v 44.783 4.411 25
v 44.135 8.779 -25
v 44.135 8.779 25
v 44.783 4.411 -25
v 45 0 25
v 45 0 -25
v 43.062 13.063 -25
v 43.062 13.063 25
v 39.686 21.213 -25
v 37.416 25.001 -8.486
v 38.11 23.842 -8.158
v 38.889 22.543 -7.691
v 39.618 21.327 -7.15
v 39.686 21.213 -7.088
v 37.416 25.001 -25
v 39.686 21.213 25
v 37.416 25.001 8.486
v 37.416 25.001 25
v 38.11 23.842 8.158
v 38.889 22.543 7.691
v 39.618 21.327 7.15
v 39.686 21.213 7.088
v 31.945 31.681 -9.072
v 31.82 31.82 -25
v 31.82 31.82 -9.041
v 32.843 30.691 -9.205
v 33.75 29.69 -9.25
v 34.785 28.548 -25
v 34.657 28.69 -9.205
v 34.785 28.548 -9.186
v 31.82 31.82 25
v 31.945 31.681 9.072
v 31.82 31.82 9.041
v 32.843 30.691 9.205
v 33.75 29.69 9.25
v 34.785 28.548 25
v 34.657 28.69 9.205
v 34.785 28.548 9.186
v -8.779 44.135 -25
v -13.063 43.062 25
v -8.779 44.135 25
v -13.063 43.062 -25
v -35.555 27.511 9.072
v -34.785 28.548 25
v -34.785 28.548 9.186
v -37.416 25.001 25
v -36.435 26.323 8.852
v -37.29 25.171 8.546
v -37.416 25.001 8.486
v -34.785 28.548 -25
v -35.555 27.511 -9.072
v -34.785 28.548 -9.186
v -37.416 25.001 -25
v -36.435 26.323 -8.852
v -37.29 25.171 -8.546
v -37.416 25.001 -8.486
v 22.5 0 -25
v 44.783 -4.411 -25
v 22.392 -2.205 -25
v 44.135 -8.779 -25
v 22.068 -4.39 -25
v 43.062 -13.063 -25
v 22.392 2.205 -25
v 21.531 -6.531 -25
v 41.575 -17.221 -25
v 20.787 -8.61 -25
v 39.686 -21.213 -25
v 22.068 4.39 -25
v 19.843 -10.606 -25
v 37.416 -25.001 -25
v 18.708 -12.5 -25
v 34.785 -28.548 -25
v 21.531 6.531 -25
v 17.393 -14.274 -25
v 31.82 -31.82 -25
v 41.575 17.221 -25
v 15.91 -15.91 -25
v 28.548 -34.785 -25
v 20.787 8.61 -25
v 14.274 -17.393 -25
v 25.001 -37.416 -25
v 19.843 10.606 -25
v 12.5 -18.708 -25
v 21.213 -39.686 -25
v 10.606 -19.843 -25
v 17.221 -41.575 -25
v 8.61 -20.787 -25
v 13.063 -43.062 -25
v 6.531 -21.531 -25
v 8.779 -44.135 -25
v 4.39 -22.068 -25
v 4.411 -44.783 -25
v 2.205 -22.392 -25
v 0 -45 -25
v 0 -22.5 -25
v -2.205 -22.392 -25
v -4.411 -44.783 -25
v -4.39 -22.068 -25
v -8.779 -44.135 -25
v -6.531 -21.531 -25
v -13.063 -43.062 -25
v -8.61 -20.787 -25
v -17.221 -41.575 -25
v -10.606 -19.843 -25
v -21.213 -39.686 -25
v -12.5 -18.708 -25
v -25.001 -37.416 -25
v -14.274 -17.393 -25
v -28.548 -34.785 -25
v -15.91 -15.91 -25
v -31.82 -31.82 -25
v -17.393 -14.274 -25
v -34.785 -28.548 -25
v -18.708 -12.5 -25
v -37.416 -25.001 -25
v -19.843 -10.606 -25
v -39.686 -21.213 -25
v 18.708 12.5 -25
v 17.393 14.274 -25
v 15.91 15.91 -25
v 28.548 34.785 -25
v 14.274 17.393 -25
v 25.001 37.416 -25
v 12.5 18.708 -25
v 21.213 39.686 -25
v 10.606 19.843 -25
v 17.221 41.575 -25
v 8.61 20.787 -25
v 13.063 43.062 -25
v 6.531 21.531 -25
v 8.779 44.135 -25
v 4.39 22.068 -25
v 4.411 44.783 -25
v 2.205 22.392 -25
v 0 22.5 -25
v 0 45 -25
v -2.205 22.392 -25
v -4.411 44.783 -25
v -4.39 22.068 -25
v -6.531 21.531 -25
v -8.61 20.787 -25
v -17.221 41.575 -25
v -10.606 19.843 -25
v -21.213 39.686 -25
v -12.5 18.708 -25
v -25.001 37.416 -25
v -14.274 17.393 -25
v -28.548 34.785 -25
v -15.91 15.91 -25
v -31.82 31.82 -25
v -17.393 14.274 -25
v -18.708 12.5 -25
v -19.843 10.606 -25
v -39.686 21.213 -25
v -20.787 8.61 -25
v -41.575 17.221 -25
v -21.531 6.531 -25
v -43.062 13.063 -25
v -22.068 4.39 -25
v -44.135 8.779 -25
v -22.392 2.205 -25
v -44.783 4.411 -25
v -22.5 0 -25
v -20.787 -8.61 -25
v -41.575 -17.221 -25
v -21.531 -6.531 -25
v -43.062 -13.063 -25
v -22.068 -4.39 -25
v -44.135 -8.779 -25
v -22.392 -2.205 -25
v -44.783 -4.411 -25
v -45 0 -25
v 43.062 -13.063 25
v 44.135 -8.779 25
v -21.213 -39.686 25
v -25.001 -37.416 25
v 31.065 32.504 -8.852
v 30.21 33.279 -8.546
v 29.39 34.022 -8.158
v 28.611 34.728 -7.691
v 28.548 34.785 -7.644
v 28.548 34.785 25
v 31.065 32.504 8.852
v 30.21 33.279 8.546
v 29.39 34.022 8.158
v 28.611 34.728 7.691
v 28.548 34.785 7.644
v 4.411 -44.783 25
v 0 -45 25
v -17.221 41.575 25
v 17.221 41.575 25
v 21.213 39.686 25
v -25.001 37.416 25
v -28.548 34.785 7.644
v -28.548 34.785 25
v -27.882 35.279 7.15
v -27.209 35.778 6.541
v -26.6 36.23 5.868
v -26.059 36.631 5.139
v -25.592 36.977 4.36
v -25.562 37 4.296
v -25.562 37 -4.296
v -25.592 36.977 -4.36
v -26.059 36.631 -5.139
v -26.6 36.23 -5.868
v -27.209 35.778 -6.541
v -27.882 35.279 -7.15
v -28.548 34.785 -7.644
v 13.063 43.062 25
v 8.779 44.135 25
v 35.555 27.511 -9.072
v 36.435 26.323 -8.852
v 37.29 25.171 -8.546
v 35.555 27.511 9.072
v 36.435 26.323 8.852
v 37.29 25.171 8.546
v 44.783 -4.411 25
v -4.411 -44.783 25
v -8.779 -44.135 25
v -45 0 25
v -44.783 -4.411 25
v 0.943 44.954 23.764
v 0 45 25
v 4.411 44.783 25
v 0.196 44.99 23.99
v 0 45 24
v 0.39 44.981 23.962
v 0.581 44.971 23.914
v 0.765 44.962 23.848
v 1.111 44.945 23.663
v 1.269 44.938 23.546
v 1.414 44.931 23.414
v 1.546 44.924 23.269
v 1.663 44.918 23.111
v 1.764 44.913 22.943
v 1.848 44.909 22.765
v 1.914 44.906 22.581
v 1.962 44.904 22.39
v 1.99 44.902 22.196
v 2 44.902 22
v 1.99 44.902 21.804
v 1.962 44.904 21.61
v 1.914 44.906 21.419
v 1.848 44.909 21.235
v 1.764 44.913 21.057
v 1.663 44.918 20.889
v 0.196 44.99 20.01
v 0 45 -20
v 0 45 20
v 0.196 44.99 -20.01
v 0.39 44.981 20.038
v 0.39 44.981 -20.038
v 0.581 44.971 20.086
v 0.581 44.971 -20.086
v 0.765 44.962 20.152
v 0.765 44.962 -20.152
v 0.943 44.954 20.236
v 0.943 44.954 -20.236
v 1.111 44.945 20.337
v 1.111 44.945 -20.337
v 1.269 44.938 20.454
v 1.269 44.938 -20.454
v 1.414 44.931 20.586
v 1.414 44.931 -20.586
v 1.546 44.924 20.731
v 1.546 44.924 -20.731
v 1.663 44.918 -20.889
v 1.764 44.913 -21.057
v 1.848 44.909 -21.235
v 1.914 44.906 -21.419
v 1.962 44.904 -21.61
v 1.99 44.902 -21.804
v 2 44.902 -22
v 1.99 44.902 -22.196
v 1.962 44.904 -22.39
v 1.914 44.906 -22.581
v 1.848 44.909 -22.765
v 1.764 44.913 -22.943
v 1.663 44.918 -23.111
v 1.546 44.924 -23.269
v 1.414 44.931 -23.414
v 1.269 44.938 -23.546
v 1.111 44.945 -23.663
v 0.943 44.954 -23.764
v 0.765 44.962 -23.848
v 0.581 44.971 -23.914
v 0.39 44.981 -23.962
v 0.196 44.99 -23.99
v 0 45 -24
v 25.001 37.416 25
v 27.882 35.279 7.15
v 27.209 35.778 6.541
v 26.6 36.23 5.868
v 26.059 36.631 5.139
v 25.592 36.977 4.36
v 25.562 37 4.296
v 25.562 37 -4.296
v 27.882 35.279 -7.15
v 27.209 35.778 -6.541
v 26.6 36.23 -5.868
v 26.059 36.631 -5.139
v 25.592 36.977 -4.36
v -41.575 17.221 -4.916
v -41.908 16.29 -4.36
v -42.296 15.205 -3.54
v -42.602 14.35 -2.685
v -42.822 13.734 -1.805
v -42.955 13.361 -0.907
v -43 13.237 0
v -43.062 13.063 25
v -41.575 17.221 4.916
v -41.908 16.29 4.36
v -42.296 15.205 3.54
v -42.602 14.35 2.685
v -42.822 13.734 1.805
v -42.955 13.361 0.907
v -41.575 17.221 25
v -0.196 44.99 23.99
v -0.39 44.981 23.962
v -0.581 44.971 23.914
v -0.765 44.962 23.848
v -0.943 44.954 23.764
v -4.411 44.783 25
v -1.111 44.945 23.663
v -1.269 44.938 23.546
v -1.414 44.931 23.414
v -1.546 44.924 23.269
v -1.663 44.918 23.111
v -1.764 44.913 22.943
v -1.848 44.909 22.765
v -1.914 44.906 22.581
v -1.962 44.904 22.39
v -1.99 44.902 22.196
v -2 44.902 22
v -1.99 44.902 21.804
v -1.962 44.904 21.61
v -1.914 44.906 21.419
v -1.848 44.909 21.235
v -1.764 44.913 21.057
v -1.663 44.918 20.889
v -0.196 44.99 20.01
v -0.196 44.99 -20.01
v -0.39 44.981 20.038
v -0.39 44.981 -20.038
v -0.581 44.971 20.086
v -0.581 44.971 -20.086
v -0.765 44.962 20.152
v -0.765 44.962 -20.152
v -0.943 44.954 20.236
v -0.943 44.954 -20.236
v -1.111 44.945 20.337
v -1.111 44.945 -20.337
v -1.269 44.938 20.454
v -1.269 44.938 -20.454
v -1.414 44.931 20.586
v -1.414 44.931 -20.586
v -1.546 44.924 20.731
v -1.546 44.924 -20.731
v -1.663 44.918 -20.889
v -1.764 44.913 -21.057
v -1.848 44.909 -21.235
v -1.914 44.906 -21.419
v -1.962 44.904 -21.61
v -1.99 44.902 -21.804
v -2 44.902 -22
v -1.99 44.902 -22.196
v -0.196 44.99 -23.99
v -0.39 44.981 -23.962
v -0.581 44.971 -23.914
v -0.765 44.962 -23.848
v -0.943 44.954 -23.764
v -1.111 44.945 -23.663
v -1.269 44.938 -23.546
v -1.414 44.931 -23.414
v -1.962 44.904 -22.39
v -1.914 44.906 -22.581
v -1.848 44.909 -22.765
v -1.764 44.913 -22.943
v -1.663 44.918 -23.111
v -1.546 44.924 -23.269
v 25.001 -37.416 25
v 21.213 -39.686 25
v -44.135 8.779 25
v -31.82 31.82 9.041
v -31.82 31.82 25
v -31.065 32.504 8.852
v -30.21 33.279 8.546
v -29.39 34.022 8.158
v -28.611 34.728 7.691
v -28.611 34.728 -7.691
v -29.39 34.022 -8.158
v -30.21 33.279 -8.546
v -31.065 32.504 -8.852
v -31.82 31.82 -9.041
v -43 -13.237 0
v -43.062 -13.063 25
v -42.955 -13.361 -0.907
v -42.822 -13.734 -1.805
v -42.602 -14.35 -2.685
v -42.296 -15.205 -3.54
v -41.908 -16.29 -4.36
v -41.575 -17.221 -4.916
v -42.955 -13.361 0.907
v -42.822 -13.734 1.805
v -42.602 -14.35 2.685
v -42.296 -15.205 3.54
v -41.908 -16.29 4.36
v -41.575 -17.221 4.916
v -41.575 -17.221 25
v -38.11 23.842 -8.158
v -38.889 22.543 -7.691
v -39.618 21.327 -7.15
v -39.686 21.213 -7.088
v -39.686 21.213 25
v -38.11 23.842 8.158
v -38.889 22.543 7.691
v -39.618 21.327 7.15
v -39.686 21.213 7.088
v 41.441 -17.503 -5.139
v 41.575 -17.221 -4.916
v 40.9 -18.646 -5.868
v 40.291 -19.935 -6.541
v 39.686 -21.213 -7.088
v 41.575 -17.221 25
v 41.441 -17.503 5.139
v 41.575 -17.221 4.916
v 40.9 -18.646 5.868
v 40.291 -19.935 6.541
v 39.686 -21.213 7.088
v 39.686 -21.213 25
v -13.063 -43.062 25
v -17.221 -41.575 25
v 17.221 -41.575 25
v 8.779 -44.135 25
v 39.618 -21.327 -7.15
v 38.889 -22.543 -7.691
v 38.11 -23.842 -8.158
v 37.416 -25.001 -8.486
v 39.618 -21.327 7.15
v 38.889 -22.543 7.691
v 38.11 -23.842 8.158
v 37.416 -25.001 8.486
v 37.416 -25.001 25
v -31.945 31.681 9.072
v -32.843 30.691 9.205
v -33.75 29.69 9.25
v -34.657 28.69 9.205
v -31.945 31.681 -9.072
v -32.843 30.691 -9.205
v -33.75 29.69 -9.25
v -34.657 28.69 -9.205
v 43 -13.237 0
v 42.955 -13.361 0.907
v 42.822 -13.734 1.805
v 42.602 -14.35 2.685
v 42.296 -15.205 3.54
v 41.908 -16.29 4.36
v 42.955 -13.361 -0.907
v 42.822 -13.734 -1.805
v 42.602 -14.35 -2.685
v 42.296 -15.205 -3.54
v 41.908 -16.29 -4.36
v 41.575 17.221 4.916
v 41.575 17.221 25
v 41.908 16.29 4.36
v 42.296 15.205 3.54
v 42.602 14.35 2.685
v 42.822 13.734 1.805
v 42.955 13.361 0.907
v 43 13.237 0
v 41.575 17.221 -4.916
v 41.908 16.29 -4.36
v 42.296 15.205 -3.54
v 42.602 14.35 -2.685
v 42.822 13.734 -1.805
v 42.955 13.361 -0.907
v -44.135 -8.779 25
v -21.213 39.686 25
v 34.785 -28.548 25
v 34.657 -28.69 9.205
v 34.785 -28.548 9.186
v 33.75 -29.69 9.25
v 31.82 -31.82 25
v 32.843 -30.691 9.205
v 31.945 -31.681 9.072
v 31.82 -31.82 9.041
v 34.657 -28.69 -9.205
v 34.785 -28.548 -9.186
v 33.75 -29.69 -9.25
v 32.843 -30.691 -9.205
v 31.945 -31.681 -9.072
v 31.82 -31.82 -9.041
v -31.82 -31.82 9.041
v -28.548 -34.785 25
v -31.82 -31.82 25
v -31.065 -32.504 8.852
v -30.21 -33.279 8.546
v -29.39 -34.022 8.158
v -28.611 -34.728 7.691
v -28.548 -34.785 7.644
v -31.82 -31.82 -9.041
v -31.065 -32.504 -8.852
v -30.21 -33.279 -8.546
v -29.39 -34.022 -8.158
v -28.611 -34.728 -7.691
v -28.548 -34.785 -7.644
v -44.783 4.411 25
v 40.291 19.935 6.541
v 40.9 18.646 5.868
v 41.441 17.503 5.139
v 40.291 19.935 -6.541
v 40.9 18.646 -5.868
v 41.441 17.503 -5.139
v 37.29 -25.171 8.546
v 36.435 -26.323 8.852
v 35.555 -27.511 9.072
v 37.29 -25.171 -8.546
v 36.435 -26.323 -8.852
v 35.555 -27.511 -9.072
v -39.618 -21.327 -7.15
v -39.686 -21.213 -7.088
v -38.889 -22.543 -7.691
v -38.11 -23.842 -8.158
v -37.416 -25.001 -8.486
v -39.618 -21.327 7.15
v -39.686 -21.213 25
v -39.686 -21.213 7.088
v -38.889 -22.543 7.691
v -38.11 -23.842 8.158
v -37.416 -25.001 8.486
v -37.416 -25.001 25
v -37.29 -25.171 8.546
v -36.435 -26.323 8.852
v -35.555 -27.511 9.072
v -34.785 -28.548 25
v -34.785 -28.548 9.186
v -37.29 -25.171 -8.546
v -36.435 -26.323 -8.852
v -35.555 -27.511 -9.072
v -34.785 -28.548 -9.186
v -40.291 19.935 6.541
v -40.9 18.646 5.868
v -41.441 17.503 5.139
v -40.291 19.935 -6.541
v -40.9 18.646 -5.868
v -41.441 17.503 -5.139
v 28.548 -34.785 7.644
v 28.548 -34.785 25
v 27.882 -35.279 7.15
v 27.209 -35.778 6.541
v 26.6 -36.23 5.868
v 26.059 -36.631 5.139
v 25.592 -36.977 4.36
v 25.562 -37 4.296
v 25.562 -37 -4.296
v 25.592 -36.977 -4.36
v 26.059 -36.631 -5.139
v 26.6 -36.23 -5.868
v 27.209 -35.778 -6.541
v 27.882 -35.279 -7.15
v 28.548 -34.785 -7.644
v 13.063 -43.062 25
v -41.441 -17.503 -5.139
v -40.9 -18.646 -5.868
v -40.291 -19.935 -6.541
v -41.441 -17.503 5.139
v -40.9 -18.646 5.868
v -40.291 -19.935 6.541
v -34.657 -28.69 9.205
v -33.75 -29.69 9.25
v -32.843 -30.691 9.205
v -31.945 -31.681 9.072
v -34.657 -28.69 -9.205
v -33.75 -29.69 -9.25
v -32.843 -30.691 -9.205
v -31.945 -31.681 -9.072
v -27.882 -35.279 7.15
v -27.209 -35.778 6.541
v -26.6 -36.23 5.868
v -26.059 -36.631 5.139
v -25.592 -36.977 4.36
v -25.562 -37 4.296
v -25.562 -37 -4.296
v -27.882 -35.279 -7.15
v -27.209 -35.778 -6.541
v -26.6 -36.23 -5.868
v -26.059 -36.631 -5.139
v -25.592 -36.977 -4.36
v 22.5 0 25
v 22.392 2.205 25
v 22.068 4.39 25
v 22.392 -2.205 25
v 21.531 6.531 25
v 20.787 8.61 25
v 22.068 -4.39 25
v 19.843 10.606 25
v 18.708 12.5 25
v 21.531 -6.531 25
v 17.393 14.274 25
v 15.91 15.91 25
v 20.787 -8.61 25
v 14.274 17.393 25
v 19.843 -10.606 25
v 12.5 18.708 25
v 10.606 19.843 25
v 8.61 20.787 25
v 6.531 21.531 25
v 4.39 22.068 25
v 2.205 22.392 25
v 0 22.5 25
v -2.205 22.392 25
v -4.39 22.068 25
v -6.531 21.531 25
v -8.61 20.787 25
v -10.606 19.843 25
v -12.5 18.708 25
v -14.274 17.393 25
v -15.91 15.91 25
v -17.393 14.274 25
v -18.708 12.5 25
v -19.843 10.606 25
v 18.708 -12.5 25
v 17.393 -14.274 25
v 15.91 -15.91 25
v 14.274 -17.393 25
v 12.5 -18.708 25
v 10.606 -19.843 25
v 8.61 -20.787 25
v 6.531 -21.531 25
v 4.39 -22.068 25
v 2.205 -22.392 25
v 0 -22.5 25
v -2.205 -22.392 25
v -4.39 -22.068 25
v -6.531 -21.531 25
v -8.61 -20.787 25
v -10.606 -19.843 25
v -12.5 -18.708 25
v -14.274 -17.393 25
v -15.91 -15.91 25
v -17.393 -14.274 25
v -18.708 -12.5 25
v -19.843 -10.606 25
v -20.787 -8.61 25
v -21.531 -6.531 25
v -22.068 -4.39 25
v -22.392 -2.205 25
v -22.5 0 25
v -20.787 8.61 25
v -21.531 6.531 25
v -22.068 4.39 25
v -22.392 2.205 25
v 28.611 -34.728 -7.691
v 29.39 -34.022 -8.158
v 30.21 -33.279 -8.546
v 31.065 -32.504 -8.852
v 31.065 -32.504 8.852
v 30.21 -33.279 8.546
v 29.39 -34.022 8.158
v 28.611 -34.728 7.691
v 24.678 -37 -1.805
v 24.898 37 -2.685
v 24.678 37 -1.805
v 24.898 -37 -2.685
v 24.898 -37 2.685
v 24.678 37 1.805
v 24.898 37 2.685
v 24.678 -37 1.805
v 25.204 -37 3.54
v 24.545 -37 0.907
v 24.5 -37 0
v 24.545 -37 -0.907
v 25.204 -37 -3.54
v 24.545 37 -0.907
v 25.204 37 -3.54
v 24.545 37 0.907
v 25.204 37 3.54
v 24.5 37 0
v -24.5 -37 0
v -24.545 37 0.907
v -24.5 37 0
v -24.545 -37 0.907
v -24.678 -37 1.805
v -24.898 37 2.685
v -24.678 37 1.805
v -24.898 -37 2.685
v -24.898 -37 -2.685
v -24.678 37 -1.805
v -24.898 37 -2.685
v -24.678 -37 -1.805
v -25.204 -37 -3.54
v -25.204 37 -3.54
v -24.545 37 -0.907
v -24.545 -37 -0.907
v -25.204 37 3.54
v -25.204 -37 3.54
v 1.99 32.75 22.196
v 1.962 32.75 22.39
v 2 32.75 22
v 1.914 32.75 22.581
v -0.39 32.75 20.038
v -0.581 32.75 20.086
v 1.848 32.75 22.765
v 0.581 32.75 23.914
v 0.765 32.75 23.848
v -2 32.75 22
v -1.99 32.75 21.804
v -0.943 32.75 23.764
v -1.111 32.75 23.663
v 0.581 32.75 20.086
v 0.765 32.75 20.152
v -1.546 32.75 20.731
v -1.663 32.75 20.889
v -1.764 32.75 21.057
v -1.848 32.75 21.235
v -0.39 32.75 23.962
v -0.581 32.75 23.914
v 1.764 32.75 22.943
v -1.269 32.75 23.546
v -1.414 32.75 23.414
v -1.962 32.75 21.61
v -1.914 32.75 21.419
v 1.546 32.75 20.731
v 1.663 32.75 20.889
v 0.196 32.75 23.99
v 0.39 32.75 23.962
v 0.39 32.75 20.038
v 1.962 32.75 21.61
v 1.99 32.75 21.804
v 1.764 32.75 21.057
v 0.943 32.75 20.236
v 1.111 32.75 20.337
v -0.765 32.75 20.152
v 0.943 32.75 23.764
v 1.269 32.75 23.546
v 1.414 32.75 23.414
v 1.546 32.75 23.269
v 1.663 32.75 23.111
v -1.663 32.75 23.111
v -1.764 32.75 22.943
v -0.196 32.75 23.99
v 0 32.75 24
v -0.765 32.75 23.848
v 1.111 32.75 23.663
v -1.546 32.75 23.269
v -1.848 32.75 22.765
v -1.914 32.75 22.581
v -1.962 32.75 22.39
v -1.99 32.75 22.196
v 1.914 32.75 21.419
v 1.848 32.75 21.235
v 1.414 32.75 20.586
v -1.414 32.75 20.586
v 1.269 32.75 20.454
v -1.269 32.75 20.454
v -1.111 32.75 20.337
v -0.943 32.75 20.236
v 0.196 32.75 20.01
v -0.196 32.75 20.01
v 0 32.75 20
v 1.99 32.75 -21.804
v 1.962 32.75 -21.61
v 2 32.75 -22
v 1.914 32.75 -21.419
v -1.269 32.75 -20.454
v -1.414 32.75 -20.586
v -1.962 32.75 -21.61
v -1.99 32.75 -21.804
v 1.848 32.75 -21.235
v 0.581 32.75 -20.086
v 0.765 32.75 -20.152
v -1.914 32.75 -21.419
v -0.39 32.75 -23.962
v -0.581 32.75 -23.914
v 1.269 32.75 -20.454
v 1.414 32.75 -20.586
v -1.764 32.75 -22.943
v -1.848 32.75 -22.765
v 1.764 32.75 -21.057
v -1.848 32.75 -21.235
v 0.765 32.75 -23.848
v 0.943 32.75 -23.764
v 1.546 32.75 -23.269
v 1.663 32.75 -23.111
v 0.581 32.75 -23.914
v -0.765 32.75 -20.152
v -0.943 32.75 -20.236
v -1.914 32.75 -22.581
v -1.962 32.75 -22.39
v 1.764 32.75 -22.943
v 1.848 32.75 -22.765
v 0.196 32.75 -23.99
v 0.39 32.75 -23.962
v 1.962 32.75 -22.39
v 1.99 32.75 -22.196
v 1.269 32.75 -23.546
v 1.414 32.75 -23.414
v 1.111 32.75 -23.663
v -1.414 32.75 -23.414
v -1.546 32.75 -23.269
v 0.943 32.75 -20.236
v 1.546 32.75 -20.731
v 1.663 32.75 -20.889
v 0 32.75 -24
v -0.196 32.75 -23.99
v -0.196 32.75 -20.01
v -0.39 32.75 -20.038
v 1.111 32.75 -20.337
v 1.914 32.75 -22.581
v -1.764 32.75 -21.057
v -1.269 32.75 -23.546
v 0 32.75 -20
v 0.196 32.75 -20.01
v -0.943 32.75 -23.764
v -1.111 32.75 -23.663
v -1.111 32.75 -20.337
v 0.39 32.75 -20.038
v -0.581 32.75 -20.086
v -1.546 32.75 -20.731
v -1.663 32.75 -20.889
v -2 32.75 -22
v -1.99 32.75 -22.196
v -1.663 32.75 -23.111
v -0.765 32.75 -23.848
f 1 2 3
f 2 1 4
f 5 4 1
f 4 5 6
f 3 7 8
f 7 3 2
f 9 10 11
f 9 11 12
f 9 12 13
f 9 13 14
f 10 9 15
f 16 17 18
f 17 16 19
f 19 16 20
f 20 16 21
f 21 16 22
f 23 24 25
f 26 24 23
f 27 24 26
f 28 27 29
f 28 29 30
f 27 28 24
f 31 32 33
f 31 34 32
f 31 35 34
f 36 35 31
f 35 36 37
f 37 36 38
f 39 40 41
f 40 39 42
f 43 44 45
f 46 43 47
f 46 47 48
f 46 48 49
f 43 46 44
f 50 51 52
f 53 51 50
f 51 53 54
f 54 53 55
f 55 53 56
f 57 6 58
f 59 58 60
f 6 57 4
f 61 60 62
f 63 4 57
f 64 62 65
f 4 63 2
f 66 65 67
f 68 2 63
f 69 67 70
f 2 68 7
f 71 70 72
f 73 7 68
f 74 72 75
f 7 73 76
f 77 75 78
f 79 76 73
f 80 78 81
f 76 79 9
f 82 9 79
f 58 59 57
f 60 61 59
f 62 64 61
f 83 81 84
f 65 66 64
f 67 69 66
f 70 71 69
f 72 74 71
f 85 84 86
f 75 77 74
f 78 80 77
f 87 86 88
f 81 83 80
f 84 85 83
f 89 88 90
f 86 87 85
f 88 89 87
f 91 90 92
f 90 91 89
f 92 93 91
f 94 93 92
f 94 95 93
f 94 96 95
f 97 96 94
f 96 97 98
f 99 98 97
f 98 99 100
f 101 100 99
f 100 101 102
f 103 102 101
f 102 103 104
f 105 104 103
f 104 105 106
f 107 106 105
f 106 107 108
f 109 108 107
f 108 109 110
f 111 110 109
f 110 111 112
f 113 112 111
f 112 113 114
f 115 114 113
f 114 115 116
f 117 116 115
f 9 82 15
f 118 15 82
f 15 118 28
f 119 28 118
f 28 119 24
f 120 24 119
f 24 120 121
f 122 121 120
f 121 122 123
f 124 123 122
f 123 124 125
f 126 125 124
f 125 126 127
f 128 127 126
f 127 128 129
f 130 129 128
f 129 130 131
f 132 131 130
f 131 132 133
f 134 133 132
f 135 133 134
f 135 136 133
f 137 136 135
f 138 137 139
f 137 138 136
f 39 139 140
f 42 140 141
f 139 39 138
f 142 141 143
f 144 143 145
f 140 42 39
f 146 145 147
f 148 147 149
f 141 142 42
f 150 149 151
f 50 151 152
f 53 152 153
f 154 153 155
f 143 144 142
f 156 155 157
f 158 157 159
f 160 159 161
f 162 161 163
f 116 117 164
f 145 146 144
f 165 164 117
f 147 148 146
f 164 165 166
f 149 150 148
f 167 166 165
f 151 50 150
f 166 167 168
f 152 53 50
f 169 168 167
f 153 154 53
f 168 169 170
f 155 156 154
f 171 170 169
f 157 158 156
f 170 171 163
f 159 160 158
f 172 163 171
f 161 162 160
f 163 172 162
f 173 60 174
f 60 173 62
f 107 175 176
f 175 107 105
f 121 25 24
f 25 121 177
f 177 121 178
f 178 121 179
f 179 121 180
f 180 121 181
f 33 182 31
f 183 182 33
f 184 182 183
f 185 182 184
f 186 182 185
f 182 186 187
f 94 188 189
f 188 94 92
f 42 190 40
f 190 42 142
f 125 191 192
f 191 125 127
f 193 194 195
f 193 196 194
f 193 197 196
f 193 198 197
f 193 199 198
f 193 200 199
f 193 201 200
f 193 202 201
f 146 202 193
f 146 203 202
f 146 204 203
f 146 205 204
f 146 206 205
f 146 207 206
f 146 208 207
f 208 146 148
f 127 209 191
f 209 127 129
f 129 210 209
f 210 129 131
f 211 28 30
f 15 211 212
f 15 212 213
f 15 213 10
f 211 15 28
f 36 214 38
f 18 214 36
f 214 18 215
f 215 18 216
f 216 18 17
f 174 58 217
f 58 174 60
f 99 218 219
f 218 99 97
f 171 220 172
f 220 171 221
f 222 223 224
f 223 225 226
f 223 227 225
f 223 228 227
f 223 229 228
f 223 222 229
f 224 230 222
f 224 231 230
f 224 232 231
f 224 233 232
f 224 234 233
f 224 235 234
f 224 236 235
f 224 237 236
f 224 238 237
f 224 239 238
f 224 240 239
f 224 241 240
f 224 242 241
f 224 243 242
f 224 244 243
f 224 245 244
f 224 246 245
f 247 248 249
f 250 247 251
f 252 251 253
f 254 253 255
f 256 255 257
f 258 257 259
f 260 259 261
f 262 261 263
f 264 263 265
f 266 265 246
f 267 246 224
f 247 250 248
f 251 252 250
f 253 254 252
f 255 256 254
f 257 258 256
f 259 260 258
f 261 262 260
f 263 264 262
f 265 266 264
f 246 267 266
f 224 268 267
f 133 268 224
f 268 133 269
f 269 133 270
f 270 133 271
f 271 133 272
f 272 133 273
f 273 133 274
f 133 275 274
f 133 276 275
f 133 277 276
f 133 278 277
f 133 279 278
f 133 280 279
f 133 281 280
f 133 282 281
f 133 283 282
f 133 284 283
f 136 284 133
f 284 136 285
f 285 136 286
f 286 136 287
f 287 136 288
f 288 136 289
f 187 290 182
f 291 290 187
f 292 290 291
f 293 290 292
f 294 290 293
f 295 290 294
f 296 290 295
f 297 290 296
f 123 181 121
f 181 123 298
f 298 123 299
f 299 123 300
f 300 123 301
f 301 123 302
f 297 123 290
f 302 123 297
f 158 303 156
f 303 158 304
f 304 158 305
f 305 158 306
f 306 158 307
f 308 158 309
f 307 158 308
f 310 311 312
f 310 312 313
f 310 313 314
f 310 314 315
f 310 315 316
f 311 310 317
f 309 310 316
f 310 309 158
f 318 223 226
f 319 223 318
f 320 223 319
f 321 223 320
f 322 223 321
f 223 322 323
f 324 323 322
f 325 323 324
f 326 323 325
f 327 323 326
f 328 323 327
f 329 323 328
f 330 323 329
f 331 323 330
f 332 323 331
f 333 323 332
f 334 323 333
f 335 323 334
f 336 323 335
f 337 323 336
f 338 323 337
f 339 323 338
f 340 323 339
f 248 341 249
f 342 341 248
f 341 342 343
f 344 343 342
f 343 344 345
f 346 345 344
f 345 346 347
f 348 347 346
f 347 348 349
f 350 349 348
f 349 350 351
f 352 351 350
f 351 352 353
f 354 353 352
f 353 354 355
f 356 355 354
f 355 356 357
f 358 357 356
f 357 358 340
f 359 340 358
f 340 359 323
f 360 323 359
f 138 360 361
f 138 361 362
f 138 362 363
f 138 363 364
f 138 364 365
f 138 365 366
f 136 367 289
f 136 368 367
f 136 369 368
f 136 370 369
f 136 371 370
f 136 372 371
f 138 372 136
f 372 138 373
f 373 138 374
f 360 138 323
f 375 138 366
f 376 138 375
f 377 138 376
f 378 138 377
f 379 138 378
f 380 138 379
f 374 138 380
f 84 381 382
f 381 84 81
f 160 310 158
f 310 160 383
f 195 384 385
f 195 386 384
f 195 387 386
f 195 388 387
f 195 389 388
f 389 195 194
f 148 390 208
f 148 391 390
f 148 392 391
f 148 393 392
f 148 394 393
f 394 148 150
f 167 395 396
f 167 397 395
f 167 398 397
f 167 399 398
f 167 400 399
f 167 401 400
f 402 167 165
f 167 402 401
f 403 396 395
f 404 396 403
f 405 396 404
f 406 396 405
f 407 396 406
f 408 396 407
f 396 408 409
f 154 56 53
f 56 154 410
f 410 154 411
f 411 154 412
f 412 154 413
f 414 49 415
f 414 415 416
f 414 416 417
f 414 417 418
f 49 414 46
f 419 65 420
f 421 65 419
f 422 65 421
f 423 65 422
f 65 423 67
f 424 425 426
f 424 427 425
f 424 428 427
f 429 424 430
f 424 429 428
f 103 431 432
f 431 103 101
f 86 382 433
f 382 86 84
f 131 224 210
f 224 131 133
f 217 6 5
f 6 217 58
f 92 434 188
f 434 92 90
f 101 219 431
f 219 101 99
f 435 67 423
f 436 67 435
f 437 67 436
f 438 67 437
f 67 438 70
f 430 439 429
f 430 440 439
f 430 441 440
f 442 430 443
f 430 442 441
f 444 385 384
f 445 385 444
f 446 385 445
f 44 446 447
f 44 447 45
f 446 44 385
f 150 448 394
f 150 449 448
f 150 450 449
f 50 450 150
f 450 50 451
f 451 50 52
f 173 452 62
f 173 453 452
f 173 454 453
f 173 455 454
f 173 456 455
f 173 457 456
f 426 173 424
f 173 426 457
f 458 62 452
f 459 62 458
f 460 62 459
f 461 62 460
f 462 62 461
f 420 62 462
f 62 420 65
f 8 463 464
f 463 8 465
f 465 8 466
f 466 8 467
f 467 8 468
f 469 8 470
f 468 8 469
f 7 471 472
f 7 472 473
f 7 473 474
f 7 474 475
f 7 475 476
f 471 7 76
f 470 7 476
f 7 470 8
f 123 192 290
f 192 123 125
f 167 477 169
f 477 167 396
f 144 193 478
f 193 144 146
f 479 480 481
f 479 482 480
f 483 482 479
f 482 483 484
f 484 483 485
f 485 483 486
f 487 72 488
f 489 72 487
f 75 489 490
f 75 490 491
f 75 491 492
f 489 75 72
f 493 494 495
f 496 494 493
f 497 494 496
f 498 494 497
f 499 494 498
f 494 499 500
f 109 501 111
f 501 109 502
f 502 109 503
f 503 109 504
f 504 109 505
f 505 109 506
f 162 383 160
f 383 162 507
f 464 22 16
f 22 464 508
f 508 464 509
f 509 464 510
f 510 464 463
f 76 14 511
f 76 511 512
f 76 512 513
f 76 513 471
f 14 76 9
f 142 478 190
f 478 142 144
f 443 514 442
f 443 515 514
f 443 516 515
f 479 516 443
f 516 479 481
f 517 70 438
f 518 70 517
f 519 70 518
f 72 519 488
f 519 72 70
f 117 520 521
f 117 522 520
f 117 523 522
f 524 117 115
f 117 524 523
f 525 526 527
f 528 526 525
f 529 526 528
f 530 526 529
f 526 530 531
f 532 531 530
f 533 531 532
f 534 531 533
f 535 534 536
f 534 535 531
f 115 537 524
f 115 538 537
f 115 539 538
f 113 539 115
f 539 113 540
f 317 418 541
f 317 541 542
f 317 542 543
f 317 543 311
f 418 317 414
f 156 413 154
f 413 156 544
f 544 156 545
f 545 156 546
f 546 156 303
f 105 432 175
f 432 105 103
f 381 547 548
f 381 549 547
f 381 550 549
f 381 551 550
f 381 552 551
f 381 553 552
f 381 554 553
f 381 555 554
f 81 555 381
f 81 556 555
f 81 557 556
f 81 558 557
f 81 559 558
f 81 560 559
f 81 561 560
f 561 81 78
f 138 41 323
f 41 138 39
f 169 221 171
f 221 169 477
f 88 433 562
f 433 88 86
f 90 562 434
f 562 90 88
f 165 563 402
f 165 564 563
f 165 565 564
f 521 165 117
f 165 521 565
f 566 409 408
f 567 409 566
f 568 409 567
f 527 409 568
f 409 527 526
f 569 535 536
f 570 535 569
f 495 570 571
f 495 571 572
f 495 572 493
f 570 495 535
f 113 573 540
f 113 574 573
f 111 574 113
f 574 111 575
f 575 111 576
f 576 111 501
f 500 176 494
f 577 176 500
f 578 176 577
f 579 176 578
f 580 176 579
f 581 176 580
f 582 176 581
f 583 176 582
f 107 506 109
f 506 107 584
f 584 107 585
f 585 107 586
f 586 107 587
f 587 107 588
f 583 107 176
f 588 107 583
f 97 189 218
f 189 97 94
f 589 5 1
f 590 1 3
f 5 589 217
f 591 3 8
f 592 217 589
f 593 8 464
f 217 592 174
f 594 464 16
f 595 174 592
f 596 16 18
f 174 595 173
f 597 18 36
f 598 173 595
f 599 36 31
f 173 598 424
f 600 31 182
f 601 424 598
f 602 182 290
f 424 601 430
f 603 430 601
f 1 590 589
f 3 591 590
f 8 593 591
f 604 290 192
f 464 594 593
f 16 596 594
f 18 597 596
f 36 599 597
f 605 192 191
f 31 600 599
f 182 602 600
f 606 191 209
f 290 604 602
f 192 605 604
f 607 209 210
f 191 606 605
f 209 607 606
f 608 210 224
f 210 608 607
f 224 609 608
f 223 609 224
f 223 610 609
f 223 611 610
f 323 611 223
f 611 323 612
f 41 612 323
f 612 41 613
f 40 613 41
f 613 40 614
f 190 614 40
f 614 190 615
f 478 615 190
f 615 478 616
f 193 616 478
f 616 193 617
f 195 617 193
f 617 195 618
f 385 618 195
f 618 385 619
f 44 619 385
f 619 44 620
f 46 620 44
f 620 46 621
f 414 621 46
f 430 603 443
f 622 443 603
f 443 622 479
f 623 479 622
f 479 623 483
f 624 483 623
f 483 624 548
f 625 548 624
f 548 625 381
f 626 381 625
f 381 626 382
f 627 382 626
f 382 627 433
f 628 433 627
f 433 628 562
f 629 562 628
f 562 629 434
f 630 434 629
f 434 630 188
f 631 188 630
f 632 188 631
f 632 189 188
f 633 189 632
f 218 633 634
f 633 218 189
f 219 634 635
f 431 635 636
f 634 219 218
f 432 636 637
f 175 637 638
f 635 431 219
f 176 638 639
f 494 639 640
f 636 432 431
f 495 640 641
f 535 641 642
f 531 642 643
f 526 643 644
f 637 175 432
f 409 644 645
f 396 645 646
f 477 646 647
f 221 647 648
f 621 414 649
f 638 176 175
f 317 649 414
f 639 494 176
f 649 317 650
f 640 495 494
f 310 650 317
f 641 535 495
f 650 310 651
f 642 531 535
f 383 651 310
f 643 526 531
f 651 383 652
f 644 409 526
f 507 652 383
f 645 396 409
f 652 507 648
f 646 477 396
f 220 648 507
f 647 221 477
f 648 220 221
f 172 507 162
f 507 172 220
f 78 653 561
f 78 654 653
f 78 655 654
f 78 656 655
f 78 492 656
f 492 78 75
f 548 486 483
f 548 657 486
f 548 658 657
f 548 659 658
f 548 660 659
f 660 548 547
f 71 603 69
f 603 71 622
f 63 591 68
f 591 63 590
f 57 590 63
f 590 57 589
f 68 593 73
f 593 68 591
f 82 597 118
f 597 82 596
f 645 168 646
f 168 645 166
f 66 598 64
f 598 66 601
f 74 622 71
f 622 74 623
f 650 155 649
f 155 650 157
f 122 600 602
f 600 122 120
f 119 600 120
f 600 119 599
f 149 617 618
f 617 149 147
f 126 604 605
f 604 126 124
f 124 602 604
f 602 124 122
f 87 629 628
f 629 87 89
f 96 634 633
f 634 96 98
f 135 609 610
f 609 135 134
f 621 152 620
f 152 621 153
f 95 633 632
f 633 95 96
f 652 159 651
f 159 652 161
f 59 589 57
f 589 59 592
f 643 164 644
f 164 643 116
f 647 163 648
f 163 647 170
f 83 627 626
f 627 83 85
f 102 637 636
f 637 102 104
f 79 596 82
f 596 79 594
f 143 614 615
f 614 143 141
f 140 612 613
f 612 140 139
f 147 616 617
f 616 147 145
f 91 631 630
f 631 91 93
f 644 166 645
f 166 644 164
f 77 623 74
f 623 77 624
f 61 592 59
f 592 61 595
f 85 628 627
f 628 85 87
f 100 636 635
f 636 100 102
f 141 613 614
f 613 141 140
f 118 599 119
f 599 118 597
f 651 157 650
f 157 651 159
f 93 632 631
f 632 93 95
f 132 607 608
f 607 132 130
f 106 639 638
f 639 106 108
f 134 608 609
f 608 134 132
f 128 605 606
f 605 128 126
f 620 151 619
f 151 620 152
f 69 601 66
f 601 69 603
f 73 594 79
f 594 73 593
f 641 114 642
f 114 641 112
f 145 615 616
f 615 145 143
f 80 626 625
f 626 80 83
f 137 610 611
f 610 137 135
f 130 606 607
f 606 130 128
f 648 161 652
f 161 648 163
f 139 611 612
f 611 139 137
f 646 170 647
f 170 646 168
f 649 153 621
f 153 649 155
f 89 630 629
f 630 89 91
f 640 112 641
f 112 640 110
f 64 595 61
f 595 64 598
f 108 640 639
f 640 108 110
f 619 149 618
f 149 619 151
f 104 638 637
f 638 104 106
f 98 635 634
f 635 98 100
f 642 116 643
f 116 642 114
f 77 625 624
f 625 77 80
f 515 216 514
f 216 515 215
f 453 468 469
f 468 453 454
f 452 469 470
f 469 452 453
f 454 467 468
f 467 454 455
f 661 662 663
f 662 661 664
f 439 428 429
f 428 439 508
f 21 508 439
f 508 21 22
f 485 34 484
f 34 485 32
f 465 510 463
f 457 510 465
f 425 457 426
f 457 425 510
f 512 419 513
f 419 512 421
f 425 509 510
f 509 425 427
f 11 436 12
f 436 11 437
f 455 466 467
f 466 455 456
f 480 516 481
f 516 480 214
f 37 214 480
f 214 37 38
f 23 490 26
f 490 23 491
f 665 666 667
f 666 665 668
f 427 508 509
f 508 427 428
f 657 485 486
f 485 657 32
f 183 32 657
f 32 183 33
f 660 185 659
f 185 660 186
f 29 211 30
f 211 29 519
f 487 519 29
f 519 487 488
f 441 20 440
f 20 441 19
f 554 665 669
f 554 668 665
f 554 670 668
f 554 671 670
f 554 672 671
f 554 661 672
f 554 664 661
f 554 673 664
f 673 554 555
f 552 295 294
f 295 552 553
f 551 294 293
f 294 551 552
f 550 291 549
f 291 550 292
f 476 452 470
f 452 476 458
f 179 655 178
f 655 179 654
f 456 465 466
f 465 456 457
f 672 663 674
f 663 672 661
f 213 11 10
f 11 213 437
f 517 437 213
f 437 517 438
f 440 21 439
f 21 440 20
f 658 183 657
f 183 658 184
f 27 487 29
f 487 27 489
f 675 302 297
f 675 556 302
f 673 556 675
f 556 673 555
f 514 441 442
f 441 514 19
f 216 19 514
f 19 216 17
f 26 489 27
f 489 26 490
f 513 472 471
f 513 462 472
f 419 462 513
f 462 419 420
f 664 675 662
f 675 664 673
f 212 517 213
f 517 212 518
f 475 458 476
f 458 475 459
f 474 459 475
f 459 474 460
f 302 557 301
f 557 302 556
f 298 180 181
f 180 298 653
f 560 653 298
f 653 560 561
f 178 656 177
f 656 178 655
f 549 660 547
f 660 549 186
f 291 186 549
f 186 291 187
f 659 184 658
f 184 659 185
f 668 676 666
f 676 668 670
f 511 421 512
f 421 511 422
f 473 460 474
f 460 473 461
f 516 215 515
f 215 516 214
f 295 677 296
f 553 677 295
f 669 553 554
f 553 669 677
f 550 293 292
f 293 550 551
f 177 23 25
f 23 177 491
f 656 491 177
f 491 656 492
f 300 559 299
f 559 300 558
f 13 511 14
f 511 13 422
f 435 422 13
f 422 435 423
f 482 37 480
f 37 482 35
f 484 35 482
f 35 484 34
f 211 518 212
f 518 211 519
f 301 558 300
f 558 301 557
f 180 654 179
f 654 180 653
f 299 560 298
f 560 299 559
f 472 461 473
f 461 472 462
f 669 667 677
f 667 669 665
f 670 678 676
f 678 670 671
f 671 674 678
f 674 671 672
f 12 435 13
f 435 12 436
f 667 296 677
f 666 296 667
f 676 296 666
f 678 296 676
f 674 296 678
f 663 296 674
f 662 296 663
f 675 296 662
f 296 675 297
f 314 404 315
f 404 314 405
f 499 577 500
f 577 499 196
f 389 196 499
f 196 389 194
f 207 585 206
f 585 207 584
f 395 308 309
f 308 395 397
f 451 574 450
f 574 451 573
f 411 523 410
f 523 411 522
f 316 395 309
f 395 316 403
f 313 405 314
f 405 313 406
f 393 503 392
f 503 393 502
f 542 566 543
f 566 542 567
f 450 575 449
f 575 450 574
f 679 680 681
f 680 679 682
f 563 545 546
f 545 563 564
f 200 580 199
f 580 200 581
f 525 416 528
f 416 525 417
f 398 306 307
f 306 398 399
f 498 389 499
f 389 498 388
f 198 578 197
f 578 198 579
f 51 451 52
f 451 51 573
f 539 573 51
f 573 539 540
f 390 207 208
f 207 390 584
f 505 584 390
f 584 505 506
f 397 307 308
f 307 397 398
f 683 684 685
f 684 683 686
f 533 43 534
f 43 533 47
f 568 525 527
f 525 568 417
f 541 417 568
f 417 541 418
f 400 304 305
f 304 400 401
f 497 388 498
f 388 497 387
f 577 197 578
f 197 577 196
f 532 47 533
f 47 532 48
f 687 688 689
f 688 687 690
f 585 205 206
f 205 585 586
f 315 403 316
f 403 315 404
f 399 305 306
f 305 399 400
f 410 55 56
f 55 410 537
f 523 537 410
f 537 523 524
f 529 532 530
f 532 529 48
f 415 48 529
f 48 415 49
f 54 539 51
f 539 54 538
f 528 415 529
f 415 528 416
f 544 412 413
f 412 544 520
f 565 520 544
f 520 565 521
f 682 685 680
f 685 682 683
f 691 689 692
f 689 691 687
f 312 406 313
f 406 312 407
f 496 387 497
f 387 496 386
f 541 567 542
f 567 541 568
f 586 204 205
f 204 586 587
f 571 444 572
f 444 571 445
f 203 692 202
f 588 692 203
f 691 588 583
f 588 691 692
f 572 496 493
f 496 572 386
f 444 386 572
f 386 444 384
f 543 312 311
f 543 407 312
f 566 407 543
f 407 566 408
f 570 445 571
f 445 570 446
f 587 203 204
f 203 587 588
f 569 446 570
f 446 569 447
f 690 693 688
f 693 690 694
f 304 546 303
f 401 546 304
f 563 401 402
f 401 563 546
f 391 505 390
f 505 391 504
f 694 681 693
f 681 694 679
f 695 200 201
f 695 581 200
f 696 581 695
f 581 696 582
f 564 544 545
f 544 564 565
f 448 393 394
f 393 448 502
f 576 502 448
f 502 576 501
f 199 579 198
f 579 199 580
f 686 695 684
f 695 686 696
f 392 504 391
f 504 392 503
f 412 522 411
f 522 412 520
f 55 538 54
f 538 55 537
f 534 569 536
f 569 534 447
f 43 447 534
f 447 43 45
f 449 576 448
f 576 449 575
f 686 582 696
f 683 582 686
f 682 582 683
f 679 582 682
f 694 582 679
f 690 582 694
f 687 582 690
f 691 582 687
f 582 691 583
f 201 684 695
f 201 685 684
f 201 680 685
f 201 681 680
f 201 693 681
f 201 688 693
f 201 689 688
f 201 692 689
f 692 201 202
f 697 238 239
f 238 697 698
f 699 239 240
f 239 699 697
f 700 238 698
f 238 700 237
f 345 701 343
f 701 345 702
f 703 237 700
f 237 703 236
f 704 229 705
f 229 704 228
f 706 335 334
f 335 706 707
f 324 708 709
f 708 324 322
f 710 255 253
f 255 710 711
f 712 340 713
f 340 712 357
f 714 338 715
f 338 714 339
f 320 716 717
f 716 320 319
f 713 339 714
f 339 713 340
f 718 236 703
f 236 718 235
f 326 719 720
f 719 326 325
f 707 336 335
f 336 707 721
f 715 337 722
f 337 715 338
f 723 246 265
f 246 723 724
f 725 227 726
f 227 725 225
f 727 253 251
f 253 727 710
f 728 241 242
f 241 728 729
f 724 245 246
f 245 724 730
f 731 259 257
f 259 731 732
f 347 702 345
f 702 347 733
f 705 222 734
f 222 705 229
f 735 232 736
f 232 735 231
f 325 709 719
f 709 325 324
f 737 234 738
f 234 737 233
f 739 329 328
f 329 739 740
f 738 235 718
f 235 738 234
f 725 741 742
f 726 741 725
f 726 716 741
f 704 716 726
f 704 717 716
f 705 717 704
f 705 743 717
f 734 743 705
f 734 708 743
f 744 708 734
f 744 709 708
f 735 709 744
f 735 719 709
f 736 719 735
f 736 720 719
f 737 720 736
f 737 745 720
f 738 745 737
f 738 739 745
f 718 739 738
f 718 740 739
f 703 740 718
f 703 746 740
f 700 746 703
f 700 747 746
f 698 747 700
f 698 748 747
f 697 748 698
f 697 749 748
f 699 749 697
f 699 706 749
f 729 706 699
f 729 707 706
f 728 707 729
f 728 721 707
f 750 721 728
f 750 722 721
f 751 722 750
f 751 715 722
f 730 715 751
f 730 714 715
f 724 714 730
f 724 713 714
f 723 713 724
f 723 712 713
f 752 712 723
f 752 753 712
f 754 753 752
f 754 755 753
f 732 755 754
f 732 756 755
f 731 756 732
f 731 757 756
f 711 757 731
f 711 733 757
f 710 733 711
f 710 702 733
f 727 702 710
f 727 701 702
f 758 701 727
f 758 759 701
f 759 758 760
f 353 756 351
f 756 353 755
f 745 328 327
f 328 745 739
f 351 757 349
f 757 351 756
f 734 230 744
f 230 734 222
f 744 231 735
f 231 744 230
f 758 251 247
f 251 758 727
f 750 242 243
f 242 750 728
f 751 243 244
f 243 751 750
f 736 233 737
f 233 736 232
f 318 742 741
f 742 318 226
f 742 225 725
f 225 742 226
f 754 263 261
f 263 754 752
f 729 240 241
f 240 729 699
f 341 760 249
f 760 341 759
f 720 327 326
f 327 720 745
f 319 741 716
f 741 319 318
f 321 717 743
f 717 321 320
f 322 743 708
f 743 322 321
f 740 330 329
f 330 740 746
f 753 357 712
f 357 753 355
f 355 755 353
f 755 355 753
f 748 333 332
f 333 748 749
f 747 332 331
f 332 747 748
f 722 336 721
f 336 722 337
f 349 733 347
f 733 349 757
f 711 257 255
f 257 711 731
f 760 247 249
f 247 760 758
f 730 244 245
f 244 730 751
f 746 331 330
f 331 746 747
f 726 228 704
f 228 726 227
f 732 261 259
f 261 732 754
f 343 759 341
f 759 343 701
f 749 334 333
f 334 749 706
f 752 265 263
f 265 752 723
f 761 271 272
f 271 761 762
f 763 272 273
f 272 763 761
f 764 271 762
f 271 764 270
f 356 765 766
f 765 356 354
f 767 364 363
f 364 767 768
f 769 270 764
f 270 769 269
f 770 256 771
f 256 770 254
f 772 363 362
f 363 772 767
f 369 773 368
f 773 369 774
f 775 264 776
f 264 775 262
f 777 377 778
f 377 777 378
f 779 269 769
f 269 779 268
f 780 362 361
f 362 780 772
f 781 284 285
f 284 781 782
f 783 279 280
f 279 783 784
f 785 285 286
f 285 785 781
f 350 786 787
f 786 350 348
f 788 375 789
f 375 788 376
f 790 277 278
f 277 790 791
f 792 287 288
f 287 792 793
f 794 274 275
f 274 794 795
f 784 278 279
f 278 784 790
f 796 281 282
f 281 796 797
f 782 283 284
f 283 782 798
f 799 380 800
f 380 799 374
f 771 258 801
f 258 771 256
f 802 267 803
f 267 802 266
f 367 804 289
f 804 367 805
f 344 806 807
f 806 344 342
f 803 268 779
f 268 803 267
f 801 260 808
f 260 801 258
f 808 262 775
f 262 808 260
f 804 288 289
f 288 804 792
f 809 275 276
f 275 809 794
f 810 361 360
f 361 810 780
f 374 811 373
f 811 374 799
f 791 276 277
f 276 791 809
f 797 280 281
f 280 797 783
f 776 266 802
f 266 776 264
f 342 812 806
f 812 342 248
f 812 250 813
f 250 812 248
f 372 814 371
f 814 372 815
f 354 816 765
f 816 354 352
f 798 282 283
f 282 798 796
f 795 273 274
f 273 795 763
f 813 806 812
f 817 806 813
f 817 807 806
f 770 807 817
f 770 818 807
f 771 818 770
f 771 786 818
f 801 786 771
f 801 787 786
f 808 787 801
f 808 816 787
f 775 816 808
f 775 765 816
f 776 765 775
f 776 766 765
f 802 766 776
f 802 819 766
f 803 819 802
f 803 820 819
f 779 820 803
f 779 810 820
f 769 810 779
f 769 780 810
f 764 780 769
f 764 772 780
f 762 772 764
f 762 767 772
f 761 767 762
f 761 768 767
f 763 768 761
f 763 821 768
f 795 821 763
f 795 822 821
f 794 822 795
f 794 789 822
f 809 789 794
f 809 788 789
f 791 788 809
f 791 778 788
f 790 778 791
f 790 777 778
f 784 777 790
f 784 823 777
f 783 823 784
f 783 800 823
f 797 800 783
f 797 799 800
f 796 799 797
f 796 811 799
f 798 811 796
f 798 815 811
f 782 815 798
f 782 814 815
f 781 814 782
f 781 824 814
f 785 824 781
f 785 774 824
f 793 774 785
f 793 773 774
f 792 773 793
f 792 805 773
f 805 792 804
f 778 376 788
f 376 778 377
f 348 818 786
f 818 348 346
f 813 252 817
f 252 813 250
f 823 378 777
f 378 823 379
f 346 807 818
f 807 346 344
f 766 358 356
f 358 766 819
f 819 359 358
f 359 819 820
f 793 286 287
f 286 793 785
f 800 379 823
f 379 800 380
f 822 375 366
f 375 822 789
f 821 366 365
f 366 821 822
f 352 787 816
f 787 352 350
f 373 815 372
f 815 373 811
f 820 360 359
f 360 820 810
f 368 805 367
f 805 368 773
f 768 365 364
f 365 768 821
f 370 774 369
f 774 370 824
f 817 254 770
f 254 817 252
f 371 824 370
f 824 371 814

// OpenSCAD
// COBRA Vertebra - L1 V19
// Height: 50.0mm, OD: 90.0mm

$fn = 64;

difference() {
    // Outer cylinder
    cylinder(h=50.0, d=90.0, center=true);
    
    // Inner channel
    cylinder(h=52.0, d=45.0, center=true);

    // Battery cavity 1
    rotate([0, 0, 0])
    translate([33.75, 0, 0])
    rotate([90, 0, 0])
    cylinder(h=74.0, d=18.5, center=true);

    // Battery cavity 2
    rotate([0, 0, 180])
    translate([33.75, 0, 0])
    rotate([90, 0, 0])
    cylinder(h=74.0, d=18.5, center=true);

    // Pivot holes
    translate([0, 45.0, 22.0])
    rotate([90, 0, 0])
    cylinder(h=24.5, d=4, center=true);
    
    translate([0, 45.0, -22.0])
    rotate([90, 0, 0])
    cylinder(h=24.5, d=4, center=true);
}
